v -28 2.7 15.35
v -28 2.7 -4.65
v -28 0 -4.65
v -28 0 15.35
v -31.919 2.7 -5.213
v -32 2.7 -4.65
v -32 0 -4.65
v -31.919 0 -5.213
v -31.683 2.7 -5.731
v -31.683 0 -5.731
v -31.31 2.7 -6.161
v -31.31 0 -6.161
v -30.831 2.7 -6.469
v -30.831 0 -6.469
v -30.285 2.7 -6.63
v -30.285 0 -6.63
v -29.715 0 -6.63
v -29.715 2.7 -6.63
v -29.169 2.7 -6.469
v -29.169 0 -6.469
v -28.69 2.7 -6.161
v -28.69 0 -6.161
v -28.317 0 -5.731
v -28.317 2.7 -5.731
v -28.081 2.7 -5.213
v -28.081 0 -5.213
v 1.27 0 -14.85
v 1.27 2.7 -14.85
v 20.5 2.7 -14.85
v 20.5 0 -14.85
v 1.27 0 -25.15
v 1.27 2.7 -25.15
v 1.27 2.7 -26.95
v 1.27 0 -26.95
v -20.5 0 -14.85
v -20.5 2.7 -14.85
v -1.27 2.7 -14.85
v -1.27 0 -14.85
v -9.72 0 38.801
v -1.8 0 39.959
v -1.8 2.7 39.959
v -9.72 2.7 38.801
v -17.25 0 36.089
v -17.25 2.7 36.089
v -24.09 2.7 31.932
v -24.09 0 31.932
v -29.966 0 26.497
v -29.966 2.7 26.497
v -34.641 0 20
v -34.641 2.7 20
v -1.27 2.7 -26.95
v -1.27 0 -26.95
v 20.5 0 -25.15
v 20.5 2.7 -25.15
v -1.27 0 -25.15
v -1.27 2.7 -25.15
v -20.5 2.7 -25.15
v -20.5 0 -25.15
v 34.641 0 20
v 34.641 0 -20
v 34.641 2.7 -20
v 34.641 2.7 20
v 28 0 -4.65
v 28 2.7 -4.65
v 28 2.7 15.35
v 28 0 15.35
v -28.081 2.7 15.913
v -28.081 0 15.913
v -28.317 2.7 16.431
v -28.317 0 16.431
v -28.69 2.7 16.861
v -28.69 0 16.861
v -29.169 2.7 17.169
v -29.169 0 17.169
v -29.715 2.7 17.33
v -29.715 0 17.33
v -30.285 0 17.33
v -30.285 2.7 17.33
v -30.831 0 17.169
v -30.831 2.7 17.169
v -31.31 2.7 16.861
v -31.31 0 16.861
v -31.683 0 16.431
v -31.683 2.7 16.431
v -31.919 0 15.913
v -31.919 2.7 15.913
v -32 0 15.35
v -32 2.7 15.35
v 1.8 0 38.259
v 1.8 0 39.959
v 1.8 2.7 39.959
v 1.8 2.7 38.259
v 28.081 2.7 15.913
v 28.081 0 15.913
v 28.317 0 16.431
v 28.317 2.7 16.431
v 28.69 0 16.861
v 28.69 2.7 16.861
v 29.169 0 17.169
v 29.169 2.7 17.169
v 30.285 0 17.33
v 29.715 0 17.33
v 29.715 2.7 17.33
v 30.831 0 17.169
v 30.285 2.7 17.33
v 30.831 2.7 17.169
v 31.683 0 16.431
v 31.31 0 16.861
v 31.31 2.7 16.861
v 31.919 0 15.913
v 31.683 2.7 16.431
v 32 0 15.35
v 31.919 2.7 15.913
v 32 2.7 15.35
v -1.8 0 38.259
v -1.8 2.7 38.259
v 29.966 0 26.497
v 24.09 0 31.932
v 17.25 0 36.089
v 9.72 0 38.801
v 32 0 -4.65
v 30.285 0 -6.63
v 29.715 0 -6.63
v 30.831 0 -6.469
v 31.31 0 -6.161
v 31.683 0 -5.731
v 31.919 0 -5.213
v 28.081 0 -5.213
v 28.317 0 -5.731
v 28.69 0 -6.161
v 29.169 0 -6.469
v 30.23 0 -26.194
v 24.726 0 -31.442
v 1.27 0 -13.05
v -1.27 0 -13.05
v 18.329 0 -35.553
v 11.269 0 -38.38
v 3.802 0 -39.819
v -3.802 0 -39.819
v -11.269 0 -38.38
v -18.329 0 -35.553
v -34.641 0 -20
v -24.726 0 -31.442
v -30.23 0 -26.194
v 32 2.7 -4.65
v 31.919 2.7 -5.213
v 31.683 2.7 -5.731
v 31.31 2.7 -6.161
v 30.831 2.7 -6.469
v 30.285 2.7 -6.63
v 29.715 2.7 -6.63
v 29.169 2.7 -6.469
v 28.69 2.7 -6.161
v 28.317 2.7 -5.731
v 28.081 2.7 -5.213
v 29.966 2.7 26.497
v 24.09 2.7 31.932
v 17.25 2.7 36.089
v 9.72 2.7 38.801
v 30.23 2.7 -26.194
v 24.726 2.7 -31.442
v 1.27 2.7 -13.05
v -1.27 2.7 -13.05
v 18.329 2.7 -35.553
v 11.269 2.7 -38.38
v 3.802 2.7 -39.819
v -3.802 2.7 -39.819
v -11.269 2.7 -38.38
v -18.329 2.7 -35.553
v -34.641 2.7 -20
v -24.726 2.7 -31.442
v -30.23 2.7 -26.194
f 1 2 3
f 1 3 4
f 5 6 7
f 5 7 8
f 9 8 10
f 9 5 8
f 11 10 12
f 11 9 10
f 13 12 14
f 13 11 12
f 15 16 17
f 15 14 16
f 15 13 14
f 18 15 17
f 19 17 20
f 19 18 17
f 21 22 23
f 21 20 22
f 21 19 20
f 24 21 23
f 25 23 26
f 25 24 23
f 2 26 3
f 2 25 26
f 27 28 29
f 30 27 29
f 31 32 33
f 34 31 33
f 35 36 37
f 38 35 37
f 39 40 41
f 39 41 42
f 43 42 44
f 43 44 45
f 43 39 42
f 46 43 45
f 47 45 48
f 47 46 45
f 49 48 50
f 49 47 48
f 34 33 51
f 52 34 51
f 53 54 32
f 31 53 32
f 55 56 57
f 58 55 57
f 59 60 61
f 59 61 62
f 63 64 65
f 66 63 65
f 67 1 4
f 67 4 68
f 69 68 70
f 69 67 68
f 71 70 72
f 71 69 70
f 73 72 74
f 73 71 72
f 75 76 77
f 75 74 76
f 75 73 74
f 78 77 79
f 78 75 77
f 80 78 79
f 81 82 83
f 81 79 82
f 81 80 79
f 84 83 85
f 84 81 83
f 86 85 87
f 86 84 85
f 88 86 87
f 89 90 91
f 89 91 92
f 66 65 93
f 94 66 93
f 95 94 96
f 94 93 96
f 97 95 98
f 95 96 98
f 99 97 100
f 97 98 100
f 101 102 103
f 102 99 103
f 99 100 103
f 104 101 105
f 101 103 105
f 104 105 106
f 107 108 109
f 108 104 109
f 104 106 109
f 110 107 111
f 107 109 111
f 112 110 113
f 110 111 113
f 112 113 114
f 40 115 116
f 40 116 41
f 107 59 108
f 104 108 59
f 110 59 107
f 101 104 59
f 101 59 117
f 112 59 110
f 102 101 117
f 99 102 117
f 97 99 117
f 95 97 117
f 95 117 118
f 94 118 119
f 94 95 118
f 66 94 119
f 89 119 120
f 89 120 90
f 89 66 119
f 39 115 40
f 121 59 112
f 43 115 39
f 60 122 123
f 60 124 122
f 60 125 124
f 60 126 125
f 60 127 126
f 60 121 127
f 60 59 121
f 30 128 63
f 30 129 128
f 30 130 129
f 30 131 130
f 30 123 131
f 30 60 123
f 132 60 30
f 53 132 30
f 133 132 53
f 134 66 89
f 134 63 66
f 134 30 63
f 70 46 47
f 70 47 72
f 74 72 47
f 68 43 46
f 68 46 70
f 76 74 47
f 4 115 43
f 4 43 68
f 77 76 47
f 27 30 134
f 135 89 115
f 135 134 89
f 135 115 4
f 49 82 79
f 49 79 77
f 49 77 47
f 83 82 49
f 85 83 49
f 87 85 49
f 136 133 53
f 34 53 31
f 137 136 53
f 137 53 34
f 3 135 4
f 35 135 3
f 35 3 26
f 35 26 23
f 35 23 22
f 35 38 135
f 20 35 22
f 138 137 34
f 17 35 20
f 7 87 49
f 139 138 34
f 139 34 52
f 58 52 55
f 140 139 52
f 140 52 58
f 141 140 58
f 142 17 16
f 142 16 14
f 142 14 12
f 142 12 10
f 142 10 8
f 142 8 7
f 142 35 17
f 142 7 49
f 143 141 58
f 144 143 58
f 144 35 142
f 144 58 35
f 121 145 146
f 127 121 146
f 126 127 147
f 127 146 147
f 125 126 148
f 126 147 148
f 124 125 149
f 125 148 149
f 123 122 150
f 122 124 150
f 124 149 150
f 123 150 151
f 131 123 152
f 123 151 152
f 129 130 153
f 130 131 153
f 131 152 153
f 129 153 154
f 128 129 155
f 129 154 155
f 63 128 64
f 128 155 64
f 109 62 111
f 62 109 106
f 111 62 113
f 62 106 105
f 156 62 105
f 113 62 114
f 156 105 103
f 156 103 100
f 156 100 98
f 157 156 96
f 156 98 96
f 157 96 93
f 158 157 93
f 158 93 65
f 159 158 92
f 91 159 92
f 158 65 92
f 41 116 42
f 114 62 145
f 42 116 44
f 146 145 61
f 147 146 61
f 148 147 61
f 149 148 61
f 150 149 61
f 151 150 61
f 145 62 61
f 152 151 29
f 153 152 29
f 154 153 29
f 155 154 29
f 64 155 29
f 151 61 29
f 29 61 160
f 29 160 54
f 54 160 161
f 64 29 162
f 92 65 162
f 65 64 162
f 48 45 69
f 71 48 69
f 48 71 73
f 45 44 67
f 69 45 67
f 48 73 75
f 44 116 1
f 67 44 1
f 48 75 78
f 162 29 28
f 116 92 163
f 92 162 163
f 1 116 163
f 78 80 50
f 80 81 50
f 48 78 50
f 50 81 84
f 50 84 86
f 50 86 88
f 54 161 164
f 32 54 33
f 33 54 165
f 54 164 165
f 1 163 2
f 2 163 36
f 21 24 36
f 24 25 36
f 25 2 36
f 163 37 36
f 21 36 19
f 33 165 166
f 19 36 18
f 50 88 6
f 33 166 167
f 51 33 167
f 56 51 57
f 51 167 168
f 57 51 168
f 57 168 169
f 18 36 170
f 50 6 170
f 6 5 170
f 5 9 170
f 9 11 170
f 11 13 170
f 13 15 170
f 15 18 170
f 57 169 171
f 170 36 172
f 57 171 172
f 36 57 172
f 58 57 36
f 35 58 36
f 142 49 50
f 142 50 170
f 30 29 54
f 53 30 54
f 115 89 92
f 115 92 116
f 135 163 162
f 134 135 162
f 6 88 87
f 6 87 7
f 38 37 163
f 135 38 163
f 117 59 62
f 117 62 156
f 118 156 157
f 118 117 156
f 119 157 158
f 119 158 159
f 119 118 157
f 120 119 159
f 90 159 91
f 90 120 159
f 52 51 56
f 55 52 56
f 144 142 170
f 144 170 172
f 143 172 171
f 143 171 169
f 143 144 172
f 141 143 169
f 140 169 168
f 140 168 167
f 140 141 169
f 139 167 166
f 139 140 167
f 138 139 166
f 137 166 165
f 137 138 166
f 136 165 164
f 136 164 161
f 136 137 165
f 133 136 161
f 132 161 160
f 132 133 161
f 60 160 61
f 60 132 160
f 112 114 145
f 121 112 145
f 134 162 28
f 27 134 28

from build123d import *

# Parameters (mm, degrees)
BASE_DEPTH                 = 2.7
WHEEL_HOLE_REACH           = 54.984
BATTERY_HOLE_REACH         = 54.984
IR_SENSOR_DIVOT_DEPTH      = 53.983865469
IR_SENSOR_DIVOT_DEPTH_BACK = 53.983865469


with BuildPart() as part:
    # Sketch1 → Base (new body)
    with BuildSketch(Plane(origin=(0, 0, 0), x_dir=(1, 0, 0), z_dir=(0, 1, 0))):
        with BuildLine():
            Line((34.641016151, 20), (34.641016151, -20))
            ThreePointArc((34.641016151, -20), (0, -40), (-34.641016151, -20))
            Line((-34.641016151, -20), (-34.641016151, 20))
            ThreePointArc((-34.641016151, 20), (0, 40), (34.641016151, 20))
        make_face()
    extrude(amount=BASE_DEPTH)

    # Sketch2 → Wheel Hole (cut, up to next)
    with BuildSketch(Plane(origin=(0, 2.7, 0), x_dir=(-1, 0, 0), z_dir=(0, 1, 0)), mode=Mode.PRIVATE) as wheel_hole_sk1:
        with BuildLine():
            Line((28, -4.65), (28, 15.35))
            ThreePointArc((28, 15.35), (30, 17.35), (32, 15.35))
            Line((32, 15.35), (32, -4.65))
            ThreePointArc((32, -4.65), (30, -6.65), (28, -4.65))
        make_face()
    wheel_hole_tool1 = extrude(wheel_hole_sk1.sketch, amount=-WHEEL_HOLE_REACH, mode=Mode.PRIVATE) & part.part
    wheel_hole = wheel_hole_tool1.solids().sort_by_distance((-30, 2.7, 5.35))[0]
    add(wheel_hole, mode=Mode.SUBTRACT)

    # Sketch6 → Battery Hole (cut, up to next)
    with BuildSketch(Plane(origin=(0, 2.7, 0), x_dir=(-1, 0, 0), z_dir=(0, 1, 0)), mode=Mode.PRIVATE) as battery_hole_sk1:
        Polygon((1.27, -14.85), (1.27, -13.05), (-1.27, -13.05), (-1.27, -14.85), (-20.5, -14.85), (-20.5, -25.15), (-1.27, -25.15), (-1.27, -26.95), (1.27, -26.95), (1.27, -25.15), (20.5, -25.15), (20.5, -14.85), align=None)
    battery_hole_tool1 = extrude(battery_hole_sk1.sketch, amount=-BATTERY_HOLE_REACH, mode=Mode.PRIVATE) & part.part
    add(battery_hole_tool1.solids().sort_by_distance((0, 2.7, -20))[0], mode=Mode.SUBTRACT)

    # Mirror 2: Wheel Hole across plane
    add(wheel_hole.mirror(Plane(origin=(0, 0, 0), x_dir=(0, 0, 1), z_dir=(1, 0, 0))), mode=Mode.SUBTRACT)

    # Sketch5 → IR Sensor Divot (cut, two sides: drawn at the far end of the back side and taken through both)
    with BuildSketch(Plane(origin=(0, 2.7, 0), x_dir=(-1, 0, 0), z_dir=(0, 1, 0)).offset(-IR_SENSOR_DIVOT_DEPTH_BACK)):
        Polygon((-1.8, 225.703224926), (-1.8, 39.959479476), (-1.8, 38.259479476), (1.8, 38.259479476), (1.8, 39.959479476), (1.8, 225.703224926), (1.8, 597.190715827), (-1.8, 597.190715827), align=None)
    extrude(amount=IR_SENSOR_DIVOT_DEPTH + IR_SENSOR_DIVOT_DEPTH_BACK, mode=Mode.SUBTRACT)


solid = part.part
